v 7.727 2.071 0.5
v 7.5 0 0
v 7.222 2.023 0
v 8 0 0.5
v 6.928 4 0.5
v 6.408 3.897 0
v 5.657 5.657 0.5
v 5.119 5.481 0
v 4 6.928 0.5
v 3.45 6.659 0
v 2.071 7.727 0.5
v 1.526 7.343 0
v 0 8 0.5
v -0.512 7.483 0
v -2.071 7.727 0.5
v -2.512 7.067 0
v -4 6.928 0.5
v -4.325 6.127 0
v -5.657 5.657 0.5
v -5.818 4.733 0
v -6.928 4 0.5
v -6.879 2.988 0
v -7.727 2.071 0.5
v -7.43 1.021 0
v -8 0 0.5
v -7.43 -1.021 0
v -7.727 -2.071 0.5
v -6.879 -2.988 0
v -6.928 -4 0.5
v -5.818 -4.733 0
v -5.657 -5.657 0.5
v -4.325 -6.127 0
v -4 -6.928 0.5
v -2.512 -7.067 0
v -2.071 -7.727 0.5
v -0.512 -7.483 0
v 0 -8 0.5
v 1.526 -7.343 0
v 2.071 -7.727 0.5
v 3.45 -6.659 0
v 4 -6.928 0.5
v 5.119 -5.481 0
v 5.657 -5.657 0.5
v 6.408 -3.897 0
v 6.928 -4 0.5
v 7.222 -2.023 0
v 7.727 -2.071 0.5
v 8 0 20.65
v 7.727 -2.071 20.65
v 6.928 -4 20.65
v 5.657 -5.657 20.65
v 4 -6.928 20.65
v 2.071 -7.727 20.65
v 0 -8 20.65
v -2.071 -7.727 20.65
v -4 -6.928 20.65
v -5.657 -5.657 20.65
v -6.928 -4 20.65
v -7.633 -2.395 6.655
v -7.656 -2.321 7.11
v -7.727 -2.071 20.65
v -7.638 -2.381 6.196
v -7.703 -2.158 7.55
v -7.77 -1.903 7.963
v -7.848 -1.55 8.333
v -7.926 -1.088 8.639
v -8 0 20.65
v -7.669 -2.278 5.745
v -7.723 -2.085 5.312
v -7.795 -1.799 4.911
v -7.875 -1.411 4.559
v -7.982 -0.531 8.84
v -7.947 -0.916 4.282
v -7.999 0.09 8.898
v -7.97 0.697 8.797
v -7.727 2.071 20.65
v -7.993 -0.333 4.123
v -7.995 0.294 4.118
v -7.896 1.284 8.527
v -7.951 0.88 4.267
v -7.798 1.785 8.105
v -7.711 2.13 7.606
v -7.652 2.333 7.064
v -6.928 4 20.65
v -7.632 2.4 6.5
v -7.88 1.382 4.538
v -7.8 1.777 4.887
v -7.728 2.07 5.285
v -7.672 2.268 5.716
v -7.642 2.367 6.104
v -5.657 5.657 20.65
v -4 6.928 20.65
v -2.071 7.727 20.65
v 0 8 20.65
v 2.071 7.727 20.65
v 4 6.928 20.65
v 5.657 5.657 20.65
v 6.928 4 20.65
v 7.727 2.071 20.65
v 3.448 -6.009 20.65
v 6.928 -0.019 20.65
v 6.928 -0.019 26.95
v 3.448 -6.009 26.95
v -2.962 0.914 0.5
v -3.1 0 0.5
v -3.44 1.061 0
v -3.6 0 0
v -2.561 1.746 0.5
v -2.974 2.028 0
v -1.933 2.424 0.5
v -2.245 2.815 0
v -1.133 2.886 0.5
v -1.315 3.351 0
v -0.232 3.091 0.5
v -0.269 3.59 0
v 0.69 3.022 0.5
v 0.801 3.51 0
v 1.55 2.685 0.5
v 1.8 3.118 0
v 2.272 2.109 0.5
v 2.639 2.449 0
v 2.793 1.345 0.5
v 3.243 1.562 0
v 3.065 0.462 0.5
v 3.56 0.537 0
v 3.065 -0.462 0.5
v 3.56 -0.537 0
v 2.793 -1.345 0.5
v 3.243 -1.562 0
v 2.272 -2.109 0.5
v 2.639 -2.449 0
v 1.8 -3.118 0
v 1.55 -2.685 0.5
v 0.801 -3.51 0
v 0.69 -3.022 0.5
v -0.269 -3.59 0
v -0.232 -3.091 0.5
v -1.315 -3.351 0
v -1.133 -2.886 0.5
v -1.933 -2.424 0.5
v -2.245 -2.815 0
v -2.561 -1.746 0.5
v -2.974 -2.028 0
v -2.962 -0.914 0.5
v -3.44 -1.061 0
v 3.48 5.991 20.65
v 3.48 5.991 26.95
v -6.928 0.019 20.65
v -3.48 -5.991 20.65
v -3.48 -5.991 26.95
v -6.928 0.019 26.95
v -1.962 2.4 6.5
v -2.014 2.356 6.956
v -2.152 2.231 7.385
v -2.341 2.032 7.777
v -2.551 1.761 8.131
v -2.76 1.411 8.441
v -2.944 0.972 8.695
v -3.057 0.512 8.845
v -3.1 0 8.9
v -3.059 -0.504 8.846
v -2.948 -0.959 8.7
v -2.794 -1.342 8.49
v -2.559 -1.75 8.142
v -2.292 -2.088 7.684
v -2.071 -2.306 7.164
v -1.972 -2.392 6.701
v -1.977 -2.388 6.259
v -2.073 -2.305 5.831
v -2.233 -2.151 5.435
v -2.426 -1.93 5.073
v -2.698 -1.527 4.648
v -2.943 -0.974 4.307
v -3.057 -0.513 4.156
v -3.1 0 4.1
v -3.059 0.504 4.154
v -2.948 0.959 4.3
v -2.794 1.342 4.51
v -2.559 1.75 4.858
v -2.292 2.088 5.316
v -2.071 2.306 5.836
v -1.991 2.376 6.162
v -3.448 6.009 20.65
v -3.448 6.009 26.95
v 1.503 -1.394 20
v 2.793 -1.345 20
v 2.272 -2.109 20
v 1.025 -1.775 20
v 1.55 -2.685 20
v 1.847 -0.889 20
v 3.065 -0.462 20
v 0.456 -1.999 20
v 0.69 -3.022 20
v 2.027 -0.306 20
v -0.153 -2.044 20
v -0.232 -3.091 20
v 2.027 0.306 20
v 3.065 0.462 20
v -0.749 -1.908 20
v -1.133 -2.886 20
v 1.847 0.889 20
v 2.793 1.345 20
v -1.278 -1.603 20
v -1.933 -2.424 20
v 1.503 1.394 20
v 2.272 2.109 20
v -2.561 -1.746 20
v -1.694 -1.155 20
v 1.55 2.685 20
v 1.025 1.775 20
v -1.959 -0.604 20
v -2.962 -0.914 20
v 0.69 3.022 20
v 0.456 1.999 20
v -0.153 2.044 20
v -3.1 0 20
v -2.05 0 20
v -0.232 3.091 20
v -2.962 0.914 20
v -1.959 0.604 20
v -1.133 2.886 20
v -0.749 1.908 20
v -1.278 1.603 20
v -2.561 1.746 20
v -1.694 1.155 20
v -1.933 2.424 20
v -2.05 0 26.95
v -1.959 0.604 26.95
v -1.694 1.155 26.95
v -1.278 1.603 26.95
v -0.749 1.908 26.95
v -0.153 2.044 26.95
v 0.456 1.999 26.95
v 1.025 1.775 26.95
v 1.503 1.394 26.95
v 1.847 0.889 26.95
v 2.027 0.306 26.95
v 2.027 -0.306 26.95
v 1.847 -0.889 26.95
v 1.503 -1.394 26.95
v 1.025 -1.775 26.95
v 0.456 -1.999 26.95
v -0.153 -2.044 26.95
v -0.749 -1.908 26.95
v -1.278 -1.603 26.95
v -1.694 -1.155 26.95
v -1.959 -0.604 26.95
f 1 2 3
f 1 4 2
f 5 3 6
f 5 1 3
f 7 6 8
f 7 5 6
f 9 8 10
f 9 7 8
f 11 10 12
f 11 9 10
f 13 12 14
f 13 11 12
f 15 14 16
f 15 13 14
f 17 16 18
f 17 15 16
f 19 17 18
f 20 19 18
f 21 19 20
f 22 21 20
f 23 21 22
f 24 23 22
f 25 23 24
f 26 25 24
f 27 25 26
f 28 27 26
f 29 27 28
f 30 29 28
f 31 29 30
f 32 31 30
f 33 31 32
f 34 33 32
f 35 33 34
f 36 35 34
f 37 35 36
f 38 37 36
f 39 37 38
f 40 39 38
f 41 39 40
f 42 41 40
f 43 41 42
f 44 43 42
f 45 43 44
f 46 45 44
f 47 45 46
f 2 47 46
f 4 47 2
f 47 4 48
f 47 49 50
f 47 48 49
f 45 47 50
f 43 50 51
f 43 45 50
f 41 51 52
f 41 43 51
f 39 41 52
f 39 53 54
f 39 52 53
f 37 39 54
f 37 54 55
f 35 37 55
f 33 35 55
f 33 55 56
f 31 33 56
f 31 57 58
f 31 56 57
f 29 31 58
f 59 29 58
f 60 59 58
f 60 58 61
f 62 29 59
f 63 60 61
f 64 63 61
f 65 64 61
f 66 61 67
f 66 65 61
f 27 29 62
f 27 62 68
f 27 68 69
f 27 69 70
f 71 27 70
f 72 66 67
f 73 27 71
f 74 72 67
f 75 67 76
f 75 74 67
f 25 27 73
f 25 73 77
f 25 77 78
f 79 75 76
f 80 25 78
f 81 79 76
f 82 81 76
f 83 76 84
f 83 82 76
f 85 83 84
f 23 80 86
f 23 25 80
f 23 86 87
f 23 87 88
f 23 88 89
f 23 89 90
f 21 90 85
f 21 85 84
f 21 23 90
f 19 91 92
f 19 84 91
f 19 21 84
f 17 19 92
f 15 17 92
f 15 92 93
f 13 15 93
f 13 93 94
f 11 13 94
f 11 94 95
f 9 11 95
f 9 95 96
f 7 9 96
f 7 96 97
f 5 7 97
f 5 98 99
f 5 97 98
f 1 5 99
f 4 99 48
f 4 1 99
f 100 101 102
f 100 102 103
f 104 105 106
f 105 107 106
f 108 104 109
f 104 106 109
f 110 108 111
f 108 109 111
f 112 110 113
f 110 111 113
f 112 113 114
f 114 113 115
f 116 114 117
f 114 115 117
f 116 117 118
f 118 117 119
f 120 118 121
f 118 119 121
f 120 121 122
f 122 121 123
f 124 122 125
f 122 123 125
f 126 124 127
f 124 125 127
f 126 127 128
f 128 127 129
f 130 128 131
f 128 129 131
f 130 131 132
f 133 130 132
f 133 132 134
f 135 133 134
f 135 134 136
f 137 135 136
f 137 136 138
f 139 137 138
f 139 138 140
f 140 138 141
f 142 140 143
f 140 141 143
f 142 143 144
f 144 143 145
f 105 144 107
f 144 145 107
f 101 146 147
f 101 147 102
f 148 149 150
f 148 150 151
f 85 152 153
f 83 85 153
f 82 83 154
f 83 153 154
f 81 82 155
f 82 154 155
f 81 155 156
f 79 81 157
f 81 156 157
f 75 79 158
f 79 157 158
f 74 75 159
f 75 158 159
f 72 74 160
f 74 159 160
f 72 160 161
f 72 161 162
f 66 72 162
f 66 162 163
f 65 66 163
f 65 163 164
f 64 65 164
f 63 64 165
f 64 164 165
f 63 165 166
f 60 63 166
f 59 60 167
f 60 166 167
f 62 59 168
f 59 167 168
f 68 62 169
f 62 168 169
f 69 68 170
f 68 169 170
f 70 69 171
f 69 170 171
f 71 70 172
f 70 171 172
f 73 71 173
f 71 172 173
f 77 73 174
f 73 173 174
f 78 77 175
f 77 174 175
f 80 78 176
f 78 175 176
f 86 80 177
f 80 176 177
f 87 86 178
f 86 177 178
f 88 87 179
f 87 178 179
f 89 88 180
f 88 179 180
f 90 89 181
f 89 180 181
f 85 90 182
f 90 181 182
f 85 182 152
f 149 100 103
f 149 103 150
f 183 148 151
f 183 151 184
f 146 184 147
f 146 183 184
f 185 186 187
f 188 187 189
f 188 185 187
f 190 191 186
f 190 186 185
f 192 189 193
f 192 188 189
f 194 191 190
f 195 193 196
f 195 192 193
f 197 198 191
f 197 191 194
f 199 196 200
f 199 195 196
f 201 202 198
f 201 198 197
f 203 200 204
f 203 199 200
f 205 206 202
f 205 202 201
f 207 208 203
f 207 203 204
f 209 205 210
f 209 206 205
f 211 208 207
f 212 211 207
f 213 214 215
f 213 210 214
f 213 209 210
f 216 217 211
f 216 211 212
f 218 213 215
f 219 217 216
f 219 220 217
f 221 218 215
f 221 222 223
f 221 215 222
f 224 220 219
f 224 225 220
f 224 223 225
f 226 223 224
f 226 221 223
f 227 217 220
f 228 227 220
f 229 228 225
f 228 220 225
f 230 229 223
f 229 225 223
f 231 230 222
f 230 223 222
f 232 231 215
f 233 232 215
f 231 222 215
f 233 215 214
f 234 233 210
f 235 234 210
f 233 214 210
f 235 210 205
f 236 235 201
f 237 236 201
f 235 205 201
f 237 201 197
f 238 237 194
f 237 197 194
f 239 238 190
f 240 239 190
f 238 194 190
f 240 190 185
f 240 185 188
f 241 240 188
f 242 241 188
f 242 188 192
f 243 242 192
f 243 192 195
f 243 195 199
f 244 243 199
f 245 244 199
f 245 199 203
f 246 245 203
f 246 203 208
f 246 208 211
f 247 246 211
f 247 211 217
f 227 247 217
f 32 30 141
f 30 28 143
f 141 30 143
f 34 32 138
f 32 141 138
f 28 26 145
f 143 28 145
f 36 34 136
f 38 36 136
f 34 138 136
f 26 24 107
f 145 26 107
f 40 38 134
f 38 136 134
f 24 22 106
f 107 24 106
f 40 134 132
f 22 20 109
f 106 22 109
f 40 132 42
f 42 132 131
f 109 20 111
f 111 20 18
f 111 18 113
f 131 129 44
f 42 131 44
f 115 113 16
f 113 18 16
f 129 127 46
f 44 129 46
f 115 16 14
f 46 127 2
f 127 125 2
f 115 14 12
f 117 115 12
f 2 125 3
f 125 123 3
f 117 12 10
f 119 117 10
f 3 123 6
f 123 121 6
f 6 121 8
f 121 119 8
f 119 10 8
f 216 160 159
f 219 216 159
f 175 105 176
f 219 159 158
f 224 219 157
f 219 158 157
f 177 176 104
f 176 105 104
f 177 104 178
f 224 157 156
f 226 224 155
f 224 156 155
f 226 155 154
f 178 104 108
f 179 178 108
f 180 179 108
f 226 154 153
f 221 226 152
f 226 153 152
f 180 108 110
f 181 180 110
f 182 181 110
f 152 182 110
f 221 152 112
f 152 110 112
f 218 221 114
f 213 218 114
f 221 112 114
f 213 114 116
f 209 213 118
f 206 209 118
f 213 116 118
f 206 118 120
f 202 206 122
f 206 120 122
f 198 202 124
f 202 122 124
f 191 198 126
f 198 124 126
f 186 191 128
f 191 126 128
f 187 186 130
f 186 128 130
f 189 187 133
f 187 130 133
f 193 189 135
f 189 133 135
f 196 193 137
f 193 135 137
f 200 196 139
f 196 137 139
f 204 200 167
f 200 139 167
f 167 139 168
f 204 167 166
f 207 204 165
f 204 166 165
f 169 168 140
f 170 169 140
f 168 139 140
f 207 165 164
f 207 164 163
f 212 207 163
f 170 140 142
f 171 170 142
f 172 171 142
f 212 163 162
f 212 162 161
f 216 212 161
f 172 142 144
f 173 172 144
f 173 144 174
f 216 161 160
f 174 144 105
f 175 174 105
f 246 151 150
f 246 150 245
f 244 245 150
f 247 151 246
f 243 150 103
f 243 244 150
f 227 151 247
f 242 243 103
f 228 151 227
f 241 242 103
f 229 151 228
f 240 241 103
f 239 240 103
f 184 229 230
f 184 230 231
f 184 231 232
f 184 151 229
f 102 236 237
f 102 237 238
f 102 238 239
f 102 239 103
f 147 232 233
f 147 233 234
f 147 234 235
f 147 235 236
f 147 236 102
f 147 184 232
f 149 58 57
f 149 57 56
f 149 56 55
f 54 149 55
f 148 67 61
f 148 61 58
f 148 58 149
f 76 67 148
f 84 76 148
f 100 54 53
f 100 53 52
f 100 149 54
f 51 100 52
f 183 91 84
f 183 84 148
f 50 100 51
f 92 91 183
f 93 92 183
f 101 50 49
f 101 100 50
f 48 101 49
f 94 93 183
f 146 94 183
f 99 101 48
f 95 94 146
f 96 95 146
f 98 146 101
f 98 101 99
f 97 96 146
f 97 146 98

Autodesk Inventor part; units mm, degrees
ref_plane "YZ Plane" through (0, 0, 0) normal (1, 0, 0) x (0, 1, 0)
ref_plane "XZ Plane" through (0, 0, 0) normal (0, 1, 0) x (-1, 0, 0)
ref_plane "XY Plane" through (0, 0, 0) normal (0, 0, 1) x (1, 0, 0)
sketch "Sketch1" plane through (0, 0, 0) normal (0, 0, 1) x (1, 0, 0)
  circle A0 centre (0, 0) radius 8
  dimension "d0" = 16
extrude "Extrusion1" add sketch "Sketch1" along normal blind 20.65
chamfer "Chamfer1" distance 0.5 angle 45 1 edges at (-8, 0, 0)
sketch "Sketch2" plane through (0, 0, 20.65) normal (0, 0, 1) x (1, 0, 0)
  circle A0 centre (0, 0) radius 8 projected
  line L0 (3.4803, 5.9906) -> (6.9282, -0.0187)
  line L1 (6.9282, -0.0187) -> (3.4479, -6.0093)
  line L2 (3.4479, -6.0093) -> (-3.4803, -5.9906)
  line L3 (-3.4803, -5.9906) -> (-6.9282, 0.0187)
  line L4 (-6.9282, 0.0187) -> (-3.4479, 6.0093)
  line L5 (-3.4479, 6.0093) -> (3.4803, 5.9906)
  line L6 (0, 0) -> (3.4803, 5.9906)
  line L7 (0, 0) -> (-3.4479, 6.0093)
  line L8 (-6.9282, 0.0187) -> (0, 0)
  line L9 (-3.4803, -5.9906) -> (0, 0)
  line L10 (3.4479, -6.0093) -> (0, 0)
  line L11 (6.9282, -0.0187) -> (0, 0)
  dimension "d9" = 12
extrude "Extrusion2" add sketch "Sketch2" along normal blind 6.3 contours L6 L7 L5 | L0 L11 L6 | L1 L10 L11 | L7 L8 L4 | L9 L3 L8 | L10 L2 L9
sketch "Sketch3" plane through (0, 0, 0) normal (0, 0, -1) x (-1, 0, 0)
  circle A0 centre (0, 0) radius 2.05
  dimension "d10" = 4.1
extrude "Extrusion3" cut sketch "Sketch3" against normal through all
sketch "Sketch4" plane through (0, 0, 0) normal (0, 0, -1) x (-1, 0, 0)
  circle A0 centre (0, 0) radius 3.1
  dimension "d16" = 6.2
extrude "Extrusion4" cut sketch "Sketch4" against normal blind 20
chamfer "Chamfer3" distance 0.5 angle 45 1 edges at (3.1, 0, 0)
sketch "Sketch5" plane through (0, 0, 0) normal (1, 0, 0) x (0, 1, 0)
  circle A0 centre (0, 6.5) radius 2.4
  line L0 (7.5, 0) -> (-7.5, 0) projected
  line L1 (-3.6, 0) -> (3.6, 0) projected
  point P0 (0, 0)
  dimension "d22" = 4.8
  dimension "d23" = 6.5
extrude "Extrusion5" cut sketch "Sketch5" against normal blind 10
properties part number "MotorToHexKey"
